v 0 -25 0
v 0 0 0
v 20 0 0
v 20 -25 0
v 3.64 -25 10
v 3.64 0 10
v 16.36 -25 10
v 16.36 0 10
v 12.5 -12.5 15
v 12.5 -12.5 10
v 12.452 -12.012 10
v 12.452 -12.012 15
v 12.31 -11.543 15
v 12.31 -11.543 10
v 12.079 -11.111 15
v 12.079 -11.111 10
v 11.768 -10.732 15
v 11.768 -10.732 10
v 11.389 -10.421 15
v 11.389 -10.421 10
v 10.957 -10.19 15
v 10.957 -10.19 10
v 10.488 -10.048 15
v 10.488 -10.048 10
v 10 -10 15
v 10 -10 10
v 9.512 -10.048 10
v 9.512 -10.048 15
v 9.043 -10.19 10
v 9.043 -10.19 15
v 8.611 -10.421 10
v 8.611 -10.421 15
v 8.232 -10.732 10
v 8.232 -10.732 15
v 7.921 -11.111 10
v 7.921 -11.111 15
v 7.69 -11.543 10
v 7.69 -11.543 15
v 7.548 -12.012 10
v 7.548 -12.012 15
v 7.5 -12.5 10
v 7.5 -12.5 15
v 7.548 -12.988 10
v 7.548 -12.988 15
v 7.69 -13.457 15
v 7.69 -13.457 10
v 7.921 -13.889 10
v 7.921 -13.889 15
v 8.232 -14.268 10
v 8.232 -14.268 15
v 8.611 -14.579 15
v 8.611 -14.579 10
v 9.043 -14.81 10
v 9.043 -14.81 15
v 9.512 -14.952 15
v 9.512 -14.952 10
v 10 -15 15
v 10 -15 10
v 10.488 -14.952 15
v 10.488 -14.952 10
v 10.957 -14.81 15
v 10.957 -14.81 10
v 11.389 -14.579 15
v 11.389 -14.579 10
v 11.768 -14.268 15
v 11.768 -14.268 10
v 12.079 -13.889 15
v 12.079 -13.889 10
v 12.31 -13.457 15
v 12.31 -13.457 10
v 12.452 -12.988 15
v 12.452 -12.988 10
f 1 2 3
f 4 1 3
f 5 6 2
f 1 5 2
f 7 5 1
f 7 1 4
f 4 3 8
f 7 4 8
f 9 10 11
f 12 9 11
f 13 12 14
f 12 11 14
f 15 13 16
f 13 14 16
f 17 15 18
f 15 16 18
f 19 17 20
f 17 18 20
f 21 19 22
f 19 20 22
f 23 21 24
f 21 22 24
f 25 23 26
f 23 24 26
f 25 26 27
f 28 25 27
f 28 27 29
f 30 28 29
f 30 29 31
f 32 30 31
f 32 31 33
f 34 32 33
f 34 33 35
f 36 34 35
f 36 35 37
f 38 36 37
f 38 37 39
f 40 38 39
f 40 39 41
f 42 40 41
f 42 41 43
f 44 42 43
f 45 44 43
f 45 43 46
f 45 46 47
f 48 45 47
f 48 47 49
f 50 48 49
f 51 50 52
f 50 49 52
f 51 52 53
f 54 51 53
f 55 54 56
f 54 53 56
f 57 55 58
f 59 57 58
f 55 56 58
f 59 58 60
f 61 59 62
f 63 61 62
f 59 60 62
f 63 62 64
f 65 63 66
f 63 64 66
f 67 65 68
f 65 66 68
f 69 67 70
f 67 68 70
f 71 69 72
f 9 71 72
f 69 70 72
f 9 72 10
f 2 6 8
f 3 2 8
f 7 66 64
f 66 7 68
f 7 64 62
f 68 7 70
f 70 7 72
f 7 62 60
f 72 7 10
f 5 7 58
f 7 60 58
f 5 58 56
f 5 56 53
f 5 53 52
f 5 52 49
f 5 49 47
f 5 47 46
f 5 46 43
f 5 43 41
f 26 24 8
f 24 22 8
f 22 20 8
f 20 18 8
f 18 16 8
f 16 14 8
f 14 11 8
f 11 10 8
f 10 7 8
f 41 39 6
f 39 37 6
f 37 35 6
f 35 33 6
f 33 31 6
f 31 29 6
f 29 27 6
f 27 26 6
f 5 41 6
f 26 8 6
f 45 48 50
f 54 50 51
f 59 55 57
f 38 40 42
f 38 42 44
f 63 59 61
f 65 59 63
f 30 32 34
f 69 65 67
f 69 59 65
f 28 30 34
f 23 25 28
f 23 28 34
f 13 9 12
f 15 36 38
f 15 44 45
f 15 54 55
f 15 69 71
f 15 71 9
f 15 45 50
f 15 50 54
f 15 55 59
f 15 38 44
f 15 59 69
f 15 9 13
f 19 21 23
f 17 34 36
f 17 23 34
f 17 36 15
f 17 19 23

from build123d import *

# Parameters (mm, degrees)
F1_DEPTH = 25
F2_R     = 2.5
F3_DEPTH = 15


with BuildPart() as f1:
    # F0 (on Front) → F1 (new body)
    with BuildSketch(Plane.XZ):
        Polygon((3.64, 10), (0, 0), (20, 0), (16.36, 10), (10, 10), align=None)
    extrude(amount=F1_DEPTH)

    # F2 (on Top) → F3 (join)
    with BuildSketch(Plane.XY):
        with Locations((10, -12.5)):
            Circle(F2_R)
    extrude(amount=F3_DEPTH)


solid = f1.part
